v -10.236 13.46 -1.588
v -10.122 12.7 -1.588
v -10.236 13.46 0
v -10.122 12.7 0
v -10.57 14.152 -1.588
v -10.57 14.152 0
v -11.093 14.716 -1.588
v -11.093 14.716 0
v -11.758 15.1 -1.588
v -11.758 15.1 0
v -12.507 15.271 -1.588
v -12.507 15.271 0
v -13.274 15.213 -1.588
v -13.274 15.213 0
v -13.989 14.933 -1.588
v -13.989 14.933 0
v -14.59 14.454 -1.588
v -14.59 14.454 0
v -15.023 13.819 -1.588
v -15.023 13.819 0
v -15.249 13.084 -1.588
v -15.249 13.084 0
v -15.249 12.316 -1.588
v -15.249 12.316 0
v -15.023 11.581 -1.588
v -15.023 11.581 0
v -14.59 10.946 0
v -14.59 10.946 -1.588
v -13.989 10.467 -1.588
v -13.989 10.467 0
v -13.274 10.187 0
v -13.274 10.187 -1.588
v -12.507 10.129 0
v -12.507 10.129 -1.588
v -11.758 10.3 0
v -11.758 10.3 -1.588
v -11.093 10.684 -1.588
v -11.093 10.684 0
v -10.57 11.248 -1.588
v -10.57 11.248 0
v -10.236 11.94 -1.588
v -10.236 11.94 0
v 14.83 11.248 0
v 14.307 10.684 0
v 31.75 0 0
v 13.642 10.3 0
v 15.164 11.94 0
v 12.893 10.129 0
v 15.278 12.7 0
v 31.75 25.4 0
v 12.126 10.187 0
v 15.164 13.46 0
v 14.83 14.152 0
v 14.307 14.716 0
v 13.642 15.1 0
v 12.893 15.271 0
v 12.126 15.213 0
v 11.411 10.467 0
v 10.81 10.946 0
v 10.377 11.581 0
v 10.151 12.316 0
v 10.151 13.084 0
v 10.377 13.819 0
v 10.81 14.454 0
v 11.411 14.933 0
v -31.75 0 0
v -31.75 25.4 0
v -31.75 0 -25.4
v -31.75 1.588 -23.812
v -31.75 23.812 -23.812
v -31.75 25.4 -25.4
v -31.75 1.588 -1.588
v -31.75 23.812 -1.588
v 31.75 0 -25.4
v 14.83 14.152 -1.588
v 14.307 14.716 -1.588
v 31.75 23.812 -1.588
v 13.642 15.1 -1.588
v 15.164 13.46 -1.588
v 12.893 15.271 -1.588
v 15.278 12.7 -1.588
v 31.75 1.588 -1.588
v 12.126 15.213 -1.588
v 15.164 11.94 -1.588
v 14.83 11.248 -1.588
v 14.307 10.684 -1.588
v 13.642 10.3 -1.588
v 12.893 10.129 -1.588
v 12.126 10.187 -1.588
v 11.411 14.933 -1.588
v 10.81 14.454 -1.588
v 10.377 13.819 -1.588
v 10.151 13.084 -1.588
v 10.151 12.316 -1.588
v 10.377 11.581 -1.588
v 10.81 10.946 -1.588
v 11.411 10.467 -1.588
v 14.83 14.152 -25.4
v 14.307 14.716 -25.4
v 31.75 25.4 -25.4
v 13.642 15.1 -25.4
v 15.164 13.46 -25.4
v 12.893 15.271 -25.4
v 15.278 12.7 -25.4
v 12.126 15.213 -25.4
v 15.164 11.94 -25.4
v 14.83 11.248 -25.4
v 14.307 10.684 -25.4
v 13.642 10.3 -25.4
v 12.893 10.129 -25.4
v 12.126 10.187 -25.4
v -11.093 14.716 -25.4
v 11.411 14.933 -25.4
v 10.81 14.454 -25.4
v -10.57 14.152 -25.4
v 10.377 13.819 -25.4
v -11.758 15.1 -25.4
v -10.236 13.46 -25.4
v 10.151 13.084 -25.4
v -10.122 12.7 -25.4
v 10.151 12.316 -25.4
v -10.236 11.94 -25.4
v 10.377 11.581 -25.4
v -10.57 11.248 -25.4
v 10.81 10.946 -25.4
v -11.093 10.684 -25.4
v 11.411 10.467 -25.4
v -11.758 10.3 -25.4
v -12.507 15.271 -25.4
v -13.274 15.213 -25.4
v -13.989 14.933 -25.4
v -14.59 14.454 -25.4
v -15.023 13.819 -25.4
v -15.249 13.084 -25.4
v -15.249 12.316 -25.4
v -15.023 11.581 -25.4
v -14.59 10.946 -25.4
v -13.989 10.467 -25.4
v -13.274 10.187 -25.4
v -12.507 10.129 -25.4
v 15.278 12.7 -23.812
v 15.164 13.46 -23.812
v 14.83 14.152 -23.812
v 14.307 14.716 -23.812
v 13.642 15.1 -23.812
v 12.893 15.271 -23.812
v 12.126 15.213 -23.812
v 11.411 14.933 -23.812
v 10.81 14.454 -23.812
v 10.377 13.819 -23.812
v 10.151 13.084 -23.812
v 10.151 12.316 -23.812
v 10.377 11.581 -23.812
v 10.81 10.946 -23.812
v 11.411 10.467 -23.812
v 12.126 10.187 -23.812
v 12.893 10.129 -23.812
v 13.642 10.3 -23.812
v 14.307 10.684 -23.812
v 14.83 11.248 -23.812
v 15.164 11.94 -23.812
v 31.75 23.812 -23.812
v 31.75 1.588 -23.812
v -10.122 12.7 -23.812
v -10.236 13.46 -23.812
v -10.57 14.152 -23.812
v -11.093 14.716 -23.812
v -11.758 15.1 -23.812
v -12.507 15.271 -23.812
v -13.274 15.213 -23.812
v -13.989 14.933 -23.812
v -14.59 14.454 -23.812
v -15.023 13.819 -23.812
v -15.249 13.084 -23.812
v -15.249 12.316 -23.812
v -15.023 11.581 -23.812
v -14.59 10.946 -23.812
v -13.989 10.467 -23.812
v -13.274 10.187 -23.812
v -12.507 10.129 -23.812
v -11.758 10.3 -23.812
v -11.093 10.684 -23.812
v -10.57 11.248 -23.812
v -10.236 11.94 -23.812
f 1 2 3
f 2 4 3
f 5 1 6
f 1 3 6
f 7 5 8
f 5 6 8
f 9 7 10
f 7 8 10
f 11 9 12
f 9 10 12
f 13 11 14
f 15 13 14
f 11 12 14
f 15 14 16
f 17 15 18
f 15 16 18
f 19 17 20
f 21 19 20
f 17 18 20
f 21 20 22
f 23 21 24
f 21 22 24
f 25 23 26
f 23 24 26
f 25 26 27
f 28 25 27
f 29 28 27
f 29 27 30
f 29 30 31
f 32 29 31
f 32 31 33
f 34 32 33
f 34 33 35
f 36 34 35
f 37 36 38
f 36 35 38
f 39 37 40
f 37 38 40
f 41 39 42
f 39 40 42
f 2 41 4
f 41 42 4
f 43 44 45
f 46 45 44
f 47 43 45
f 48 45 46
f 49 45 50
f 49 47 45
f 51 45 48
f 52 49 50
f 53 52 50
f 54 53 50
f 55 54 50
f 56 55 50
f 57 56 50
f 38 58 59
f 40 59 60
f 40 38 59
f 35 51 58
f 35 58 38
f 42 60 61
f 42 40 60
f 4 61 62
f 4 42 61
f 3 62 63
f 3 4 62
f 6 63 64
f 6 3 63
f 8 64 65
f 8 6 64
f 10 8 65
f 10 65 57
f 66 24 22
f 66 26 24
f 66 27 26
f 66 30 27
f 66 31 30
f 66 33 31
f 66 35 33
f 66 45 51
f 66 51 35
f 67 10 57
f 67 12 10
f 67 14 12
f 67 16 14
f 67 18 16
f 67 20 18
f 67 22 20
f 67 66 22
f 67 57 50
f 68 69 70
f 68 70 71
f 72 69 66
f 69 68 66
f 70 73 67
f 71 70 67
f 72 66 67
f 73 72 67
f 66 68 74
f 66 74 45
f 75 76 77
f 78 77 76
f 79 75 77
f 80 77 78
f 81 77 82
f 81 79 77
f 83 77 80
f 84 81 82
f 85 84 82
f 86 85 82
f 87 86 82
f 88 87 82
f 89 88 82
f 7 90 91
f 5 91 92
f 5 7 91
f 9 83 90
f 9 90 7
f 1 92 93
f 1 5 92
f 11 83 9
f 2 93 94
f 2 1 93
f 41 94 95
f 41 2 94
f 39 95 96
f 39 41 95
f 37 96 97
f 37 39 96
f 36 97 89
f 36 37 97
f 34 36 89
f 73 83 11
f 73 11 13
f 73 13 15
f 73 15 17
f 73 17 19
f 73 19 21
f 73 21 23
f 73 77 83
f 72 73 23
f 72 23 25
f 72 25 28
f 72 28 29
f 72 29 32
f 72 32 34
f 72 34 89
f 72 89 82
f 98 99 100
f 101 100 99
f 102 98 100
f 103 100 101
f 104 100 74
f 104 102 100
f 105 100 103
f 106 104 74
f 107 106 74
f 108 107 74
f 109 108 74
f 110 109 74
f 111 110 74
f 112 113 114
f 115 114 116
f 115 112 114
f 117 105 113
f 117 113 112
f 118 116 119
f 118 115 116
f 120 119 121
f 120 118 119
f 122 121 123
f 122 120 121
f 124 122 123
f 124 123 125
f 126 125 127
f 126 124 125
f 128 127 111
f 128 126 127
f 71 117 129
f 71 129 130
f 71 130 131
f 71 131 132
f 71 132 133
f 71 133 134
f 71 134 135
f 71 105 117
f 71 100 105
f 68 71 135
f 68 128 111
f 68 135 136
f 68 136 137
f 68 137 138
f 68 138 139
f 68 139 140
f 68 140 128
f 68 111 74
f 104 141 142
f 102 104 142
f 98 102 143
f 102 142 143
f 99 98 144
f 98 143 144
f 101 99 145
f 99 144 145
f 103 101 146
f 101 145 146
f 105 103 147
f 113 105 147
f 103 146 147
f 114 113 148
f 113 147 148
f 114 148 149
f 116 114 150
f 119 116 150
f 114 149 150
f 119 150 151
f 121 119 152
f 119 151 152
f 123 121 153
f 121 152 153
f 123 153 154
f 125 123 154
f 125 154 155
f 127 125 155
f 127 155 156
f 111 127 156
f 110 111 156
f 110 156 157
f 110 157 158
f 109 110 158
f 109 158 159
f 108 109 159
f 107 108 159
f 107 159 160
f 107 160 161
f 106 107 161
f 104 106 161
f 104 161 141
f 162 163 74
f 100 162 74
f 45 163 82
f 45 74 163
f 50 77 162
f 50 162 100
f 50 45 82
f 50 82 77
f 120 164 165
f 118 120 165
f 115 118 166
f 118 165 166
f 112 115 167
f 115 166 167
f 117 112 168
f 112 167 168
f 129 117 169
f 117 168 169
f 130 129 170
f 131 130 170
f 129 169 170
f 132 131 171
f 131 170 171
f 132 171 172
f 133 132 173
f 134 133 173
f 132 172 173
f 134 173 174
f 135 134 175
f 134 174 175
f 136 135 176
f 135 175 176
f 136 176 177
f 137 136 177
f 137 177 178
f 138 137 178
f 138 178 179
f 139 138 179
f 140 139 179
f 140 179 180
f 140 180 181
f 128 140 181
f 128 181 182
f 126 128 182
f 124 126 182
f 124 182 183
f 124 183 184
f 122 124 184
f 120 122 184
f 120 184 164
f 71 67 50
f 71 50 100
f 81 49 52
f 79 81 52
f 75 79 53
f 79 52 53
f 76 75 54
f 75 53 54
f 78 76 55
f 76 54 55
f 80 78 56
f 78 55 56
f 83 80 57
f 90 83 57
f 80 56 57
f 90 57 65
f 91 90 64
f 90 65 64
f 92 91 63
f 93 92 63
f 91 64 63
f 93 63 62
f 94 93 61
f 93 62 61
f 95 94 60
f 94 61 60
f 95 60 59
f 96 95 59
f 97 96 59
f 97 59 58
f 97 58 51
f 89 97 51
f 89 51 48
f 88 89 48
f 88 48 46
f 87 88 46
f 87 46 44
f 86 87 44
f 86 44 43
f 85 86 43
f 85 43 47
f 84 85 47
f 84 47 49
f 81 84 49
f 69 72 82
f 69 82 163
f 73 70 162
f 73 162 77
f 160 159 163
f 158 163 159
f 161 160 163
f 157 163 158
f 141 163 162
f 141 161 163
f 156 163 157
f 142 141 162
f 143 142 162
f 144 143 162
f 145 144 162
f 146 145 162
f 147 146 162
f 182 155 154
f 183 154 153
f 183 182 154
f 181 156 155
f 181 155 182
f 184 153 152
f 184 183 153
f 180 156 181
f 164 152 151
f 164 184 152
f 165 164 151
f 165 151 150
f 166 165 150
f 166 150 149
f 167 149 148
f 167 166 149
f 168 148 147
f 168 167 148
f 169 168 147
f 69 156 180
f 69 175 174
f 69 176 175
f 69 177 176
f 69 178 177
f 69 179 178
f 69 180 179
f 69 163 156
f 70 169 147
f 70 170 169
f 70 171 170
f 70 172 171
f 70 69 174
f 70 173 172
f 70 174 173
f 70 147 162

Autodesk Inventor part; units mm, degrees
ref_plane "YZ Plane" through (0, 0, 0) normal (1, 0, 0) x (0, 1, 0)
ref_plane "XZ Plane" through (0, 0, 0) normal (0, 1, 0) x (-1, 0, 0)
ref_plane "XY Plane" through (0, 0, 0) normal (0, 0, 1) x (1, 0, 0)
sketch "Sketch1" plane through (0, 0, 0) normal (1, 0, 0) x (0, 1, 0)
  line L0 (0, 0) -> (25.4, 0)
  line L1 (25.4, 0) -> (25.4, -25.4)
  line L2 (25.4, -25.4) -> (0, -25.4)
  line L3 (0, -25.4) -> (0, 0)
  line L4 (23.8125, -23.8125) -> (23.8125, -1.5875)
  line L5 (23.8125, -1.5875) -> (1.5875, -1.5875)
  line L6 (1.5875, -1.5875) -> (1.5875, -23.8125)
  line L7 (1.5875, -23.8125) -> (23.8125, -23.8125)
  dimension "d0" = 25.4
  dimension "d1" = 25.4
  dimension "d2" = 1.5875
extrude "Extrusion1" add sketch "Sketch1" along normal mid plane 63.5
sketch "Sketch3" plane through (-31.75, 0, 0) normal (0, 0, 1) x (1, 0, 0)
  line L0 (0, 0) -> (63.5, 0) projected
  line L1 (63.5, 25.4) -> (63.5, 0) projected
  line L2 (0, 25.4) -> (63.5, 25.4) projected
  line L3 (0, 0) -> (0, 25.4) projected
  circle A0 centre (19.05, 12.7) radius 2.5781
  circle A1 centre (44.45, 12.7) radius 2.5781
  line L4 (31.75, 25.4) -> (31.75, 0) construction
  dimension "d14" = 5.1562
  dimension "d15" = 5.1562
  dimension "d16" = 12.7
  dimension "d17" = 25.4
  dimension "d20" = 12.7
extrude "Extrusion3" cut sketch "Sketch3" against normal blind 25.4 contours A0 | A1
properties part number "1inTubeBase"
